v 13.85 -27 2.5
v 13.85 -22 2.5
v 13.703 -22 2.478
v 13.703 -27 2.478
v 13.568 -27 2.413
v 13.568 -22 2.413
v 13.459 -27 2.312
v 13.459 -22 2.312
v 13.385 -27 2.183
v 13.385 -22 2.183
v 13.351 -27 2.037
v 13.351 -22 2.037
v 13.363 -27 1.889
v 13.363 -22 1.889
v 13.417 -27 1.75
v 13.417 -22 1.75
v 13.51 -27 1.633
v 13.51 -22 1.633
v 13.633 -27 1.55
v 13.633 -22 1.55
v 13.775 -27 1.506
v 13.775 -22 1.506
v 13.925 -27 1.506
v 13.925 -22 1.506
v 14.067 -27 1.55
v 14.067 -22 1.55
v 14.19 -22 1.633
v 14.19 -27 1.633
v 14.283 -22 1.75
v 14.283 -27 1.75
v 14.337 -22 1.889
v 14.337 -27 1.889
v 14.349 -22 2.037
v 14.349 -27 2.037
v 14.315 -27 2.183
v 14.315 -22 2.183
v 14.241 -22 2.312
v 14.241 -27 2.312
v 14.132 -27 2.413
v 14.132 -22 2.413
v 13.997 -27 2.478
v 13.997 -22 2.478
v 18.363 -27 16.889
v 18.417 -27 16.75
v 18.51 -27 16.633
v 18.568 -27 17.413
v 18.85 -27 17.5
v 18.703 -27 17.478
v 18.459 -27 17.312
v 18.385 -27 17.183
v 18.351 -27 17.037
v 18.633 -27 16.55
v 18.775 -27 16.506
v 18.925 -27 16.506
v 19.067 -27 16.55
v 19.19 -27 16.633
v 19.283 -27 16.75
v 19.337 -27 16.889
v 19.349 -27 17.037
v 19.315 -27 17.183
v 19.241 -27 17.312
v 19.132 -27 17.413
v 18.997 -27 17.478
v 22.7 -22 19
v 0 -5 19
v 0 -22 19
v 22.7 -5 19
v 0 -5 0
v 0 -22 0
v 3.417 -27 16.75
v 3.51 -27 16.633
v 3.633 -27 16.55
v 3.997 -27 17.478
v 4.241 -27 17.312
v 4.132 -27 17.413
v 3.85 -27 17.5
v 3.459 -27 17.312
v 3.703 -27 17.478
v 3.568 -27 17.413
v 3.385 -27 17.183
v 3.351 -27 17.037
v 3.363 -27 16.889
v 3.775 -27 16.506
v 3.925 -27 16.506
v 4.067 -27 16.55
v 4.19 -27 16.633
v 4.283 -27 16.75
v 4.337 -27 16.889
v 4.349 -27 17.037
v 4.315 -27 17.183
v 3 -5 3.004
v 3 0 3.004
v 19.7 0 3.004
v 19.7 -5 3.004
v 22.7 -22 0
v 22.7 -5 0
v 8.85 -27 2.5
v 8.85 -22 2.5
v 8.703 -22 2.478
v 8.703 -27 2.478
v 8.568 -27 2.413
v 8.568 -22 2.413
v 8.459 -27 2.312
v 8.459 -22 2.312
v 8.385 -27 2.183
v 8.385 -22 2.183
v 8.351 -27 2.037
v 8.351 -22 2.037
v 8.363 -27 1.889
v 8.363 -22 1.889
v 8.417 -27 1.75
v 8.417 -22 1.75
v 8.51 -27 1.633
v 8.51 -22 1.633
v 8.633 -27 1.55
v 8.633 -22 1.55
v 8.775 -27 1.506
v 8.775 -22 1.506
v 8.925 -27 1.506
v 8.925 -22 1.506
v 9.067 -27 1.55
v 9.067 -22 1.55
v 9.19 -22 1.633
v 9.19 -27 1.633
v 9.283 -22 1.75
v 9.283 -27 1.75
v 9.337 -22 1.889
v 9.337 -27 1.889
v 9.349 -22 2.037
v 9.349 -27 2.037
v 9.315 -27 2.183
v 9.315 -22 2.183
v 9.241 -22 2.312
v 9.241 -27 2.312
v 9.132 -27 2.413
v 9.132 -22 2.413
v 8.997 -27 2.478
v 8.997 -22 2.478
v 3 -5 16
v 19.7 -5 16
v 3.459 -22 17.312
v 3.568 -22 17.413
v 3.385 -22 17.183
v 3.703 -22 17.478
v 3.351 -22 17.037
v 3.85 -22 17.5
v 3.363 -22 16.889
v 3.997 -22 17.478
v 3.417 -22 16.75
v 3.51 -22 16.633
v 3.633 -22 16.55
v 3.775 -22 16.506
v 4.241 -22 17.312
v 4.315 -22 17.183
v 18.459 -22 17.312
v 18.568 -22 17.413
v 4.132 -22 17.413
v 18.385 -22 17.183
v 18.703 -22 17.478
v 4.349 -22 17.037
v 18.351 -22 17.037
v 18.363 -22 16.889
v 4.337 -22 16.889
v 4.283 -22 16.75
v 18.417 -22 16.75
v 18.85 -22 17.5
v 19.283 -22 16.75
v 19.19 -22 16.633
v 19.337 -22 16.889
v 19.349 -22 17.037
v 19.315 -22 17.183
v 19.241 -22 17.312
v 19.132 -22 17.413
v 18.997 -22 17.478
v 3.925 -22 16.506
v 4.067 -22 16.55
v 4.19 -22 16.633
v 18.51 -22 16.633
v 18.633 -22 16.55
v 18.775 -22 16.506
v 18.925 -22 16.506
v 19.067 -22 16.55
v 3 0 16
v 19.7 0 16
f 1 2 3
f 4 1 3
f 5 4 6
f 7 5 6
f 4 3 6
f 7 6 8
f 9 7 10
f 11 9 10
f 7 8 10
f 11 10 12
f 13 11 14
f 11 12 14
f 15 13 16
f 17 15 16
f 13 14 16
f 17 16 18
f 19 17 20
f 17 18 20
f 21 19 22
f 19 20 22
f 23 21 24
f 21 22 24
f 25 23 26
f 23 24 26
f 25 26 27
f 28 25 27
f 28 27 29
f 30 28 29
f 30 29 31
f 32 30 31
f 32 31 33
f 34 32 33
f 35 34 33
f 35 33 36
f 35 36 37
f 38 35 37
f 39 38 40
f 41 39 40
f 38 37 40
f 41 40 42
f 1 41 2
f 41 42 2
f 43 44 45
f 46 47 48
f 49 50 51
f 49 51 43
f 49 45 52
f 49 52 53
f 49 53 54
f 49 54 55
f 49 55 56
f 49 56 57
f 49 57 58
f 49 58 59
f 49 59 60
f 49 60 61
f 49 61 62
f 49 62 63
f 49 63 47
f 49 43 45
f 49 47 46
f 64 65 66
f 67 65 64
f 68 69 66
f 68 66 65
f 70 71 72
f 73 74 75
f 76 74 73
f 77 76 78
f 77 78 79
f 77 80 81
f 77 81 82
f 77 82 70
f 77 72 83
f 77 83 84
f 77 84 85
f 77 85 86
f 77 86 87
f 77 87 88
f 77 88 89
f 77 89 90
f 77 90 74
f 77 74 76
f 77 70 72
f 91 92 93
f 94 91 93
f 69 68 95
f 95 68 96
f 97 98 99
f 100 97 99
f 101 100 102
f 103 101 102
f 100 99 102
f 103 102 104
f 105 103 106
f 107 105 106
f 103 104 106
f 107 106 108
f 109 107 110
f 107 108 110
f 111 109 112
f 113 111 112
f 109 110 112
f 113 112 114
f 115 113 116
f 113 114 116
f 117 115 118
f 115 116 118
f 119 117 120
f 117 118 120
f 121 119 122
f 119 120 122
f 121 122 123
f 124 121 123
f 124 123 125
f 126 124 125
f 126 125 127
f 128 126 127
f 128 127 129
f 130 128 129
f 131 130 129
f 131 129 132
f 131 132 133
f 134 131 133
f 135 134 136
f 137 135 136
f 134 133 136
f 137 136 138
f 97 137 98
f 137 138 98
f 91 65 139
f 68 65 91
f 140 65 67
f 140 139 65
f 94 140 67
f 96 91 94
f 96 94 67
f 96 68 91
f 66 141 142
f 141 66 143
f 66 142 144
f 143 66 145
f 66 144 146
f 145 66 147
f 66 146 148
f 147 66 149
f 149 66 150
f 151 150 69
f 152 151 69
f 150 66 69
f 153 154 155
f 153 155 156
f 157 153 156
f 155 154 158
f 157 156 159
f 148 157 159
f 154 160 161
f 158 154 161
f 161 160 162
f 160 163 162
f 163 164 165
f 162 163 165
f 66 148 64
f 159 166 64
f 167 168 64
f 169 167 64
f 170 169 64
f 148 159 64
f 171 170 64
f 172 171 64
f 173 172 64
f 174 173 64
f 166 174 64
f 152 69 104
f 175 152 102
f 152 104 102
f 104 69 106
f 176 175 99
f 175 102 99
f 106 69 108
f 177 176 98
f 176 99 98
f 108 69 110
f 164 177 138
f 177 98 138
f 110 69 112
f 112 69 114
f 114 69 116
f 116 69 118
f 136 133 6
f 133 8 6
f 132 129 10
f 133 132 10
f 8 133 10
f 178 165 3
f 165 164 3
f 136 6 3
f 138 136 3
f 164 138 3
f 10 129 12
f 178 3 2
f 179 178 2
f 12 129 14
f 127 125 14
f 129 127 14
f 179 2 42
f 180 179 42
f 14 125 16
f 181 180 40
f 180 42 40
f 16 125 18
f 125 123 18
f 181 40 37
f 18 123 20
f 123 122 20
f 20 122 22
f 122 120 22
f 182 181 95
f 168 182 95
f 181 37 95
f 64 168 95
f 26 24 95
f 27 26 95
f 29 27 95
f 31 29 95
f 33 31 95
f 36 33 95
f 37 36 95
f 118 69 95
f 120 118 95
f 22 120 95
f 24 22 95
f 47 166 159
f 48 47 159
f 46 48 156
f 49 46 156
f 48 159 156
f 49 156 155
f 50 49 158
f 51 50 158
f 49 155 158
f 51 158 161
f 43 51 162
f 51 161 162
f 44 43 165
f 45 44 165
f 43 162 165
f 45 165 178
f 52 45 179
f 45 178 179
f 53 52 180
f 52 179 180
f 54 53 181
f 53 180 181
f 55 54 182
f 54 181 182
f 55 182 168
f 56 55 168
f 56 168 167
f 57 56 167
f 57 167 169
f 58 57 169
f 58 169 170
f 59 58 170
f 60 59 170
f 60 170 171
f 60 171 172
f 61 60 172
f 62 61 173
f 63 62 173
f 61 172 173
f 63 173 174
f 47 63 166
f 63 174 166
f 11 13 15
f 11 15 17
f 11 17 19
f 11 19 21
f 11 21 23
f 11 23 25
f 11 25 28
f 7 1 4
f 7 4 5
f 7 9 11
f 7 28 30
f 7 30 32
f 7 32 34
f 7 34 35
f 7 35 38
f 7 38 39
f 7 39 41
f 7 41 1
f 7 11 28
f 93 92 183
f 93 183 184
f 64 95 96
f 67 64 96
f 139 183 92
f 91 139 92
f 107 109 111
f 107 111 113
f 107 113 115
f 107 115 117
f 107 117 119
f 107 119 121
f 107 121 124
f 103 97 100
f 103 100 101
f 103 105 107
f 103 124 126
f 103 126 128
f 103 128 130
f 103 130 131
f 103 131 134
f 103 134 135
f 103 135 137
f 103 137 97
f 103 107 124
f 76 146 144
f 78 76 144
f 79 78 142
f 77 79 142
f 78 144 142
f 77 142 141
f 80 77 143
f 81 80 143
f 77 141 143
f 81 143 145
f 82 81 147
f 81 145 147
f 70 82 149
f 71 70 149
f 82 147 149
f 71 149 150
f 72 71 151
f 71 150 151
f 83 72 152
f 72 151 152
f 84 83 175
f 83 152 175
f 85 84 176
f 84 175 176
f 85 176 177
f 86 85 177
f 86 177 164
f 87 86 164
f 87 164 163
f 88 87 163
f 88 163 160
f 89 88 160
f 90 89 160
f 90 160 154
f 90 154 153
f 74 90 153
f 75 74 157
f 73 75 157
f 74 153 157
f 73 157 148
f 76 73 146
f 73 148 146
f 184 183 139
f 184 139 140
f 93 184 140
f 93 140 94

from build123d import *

# Parameters (mm, degrees)
SKETCH2_W           = 22.7
SKETCH2_H           = 22
BOSS_EXTRUDE1_DEPTH = 19
SKETCH3_R           = 0.5
BOSS_EXTRUDE2_DEPTH = 5
SKETCH5_W           = 22.7
SKETCH5_H           = 19
SKETCH5_W_2         = 16.7
SKETCH5_H_2         = 12.996403956
CUT_EXTRUDE1_DEPTH  = 5


with BuildPart() as part:
    # Sketch2 → Boss-Extrude1 (new body)
    with BuildSketch(Plane.XY):
        with Locations((11.35, -11)):
            Rectangle(SKETCH2_W, SKETCH2_H)
    extrude(amount=BOSS_EXTRUDE1_DEPTH)

    # Sketch3 → Boss-Extrude2 (add)
    with BuildSketch(Plane.XZ.offset(22)):
        with Locations(Location((18.85, 17, 0), (0, 0, 90))):
            Circle(SKETCH3_R)
        with Locations(Location((3.85, 17, 0), (0, 0, 90))):
            Circle(SKETCH3_R)
        with Locations(Location((8.85, 2, 0), (0, 0, 90))):
            Circle(SKETCH3_R)
        with Locations(Location((13.85, 2, 0), (0, 0, 90))):
            Circle(SKETCH3_R)
    extrude(amount=BOSS_EXTRUDE2_DEPTH)

    # Sketch5 → Cut-Extrude1 (cut)
    with BuildSketch(Plane(origin=(0, 0, 0), x_dir=(1, 0, 0), z_dir=(0, 1, 0))):
        with Locations((11.35, -9.5)):
            Rectangle(SKETCH5_W, SKETCH5_H)
        with Locations((11.35, -9.501798022)):
            Rectangle(SKETCH5_W_2, SKETCH5_H_2, mode=Mode.SUBTRACT)
    extrude(amount=-CUT_EXTRUDE1_DEPTH, mode=Mode.SUBTRACT)


solid = part.part
